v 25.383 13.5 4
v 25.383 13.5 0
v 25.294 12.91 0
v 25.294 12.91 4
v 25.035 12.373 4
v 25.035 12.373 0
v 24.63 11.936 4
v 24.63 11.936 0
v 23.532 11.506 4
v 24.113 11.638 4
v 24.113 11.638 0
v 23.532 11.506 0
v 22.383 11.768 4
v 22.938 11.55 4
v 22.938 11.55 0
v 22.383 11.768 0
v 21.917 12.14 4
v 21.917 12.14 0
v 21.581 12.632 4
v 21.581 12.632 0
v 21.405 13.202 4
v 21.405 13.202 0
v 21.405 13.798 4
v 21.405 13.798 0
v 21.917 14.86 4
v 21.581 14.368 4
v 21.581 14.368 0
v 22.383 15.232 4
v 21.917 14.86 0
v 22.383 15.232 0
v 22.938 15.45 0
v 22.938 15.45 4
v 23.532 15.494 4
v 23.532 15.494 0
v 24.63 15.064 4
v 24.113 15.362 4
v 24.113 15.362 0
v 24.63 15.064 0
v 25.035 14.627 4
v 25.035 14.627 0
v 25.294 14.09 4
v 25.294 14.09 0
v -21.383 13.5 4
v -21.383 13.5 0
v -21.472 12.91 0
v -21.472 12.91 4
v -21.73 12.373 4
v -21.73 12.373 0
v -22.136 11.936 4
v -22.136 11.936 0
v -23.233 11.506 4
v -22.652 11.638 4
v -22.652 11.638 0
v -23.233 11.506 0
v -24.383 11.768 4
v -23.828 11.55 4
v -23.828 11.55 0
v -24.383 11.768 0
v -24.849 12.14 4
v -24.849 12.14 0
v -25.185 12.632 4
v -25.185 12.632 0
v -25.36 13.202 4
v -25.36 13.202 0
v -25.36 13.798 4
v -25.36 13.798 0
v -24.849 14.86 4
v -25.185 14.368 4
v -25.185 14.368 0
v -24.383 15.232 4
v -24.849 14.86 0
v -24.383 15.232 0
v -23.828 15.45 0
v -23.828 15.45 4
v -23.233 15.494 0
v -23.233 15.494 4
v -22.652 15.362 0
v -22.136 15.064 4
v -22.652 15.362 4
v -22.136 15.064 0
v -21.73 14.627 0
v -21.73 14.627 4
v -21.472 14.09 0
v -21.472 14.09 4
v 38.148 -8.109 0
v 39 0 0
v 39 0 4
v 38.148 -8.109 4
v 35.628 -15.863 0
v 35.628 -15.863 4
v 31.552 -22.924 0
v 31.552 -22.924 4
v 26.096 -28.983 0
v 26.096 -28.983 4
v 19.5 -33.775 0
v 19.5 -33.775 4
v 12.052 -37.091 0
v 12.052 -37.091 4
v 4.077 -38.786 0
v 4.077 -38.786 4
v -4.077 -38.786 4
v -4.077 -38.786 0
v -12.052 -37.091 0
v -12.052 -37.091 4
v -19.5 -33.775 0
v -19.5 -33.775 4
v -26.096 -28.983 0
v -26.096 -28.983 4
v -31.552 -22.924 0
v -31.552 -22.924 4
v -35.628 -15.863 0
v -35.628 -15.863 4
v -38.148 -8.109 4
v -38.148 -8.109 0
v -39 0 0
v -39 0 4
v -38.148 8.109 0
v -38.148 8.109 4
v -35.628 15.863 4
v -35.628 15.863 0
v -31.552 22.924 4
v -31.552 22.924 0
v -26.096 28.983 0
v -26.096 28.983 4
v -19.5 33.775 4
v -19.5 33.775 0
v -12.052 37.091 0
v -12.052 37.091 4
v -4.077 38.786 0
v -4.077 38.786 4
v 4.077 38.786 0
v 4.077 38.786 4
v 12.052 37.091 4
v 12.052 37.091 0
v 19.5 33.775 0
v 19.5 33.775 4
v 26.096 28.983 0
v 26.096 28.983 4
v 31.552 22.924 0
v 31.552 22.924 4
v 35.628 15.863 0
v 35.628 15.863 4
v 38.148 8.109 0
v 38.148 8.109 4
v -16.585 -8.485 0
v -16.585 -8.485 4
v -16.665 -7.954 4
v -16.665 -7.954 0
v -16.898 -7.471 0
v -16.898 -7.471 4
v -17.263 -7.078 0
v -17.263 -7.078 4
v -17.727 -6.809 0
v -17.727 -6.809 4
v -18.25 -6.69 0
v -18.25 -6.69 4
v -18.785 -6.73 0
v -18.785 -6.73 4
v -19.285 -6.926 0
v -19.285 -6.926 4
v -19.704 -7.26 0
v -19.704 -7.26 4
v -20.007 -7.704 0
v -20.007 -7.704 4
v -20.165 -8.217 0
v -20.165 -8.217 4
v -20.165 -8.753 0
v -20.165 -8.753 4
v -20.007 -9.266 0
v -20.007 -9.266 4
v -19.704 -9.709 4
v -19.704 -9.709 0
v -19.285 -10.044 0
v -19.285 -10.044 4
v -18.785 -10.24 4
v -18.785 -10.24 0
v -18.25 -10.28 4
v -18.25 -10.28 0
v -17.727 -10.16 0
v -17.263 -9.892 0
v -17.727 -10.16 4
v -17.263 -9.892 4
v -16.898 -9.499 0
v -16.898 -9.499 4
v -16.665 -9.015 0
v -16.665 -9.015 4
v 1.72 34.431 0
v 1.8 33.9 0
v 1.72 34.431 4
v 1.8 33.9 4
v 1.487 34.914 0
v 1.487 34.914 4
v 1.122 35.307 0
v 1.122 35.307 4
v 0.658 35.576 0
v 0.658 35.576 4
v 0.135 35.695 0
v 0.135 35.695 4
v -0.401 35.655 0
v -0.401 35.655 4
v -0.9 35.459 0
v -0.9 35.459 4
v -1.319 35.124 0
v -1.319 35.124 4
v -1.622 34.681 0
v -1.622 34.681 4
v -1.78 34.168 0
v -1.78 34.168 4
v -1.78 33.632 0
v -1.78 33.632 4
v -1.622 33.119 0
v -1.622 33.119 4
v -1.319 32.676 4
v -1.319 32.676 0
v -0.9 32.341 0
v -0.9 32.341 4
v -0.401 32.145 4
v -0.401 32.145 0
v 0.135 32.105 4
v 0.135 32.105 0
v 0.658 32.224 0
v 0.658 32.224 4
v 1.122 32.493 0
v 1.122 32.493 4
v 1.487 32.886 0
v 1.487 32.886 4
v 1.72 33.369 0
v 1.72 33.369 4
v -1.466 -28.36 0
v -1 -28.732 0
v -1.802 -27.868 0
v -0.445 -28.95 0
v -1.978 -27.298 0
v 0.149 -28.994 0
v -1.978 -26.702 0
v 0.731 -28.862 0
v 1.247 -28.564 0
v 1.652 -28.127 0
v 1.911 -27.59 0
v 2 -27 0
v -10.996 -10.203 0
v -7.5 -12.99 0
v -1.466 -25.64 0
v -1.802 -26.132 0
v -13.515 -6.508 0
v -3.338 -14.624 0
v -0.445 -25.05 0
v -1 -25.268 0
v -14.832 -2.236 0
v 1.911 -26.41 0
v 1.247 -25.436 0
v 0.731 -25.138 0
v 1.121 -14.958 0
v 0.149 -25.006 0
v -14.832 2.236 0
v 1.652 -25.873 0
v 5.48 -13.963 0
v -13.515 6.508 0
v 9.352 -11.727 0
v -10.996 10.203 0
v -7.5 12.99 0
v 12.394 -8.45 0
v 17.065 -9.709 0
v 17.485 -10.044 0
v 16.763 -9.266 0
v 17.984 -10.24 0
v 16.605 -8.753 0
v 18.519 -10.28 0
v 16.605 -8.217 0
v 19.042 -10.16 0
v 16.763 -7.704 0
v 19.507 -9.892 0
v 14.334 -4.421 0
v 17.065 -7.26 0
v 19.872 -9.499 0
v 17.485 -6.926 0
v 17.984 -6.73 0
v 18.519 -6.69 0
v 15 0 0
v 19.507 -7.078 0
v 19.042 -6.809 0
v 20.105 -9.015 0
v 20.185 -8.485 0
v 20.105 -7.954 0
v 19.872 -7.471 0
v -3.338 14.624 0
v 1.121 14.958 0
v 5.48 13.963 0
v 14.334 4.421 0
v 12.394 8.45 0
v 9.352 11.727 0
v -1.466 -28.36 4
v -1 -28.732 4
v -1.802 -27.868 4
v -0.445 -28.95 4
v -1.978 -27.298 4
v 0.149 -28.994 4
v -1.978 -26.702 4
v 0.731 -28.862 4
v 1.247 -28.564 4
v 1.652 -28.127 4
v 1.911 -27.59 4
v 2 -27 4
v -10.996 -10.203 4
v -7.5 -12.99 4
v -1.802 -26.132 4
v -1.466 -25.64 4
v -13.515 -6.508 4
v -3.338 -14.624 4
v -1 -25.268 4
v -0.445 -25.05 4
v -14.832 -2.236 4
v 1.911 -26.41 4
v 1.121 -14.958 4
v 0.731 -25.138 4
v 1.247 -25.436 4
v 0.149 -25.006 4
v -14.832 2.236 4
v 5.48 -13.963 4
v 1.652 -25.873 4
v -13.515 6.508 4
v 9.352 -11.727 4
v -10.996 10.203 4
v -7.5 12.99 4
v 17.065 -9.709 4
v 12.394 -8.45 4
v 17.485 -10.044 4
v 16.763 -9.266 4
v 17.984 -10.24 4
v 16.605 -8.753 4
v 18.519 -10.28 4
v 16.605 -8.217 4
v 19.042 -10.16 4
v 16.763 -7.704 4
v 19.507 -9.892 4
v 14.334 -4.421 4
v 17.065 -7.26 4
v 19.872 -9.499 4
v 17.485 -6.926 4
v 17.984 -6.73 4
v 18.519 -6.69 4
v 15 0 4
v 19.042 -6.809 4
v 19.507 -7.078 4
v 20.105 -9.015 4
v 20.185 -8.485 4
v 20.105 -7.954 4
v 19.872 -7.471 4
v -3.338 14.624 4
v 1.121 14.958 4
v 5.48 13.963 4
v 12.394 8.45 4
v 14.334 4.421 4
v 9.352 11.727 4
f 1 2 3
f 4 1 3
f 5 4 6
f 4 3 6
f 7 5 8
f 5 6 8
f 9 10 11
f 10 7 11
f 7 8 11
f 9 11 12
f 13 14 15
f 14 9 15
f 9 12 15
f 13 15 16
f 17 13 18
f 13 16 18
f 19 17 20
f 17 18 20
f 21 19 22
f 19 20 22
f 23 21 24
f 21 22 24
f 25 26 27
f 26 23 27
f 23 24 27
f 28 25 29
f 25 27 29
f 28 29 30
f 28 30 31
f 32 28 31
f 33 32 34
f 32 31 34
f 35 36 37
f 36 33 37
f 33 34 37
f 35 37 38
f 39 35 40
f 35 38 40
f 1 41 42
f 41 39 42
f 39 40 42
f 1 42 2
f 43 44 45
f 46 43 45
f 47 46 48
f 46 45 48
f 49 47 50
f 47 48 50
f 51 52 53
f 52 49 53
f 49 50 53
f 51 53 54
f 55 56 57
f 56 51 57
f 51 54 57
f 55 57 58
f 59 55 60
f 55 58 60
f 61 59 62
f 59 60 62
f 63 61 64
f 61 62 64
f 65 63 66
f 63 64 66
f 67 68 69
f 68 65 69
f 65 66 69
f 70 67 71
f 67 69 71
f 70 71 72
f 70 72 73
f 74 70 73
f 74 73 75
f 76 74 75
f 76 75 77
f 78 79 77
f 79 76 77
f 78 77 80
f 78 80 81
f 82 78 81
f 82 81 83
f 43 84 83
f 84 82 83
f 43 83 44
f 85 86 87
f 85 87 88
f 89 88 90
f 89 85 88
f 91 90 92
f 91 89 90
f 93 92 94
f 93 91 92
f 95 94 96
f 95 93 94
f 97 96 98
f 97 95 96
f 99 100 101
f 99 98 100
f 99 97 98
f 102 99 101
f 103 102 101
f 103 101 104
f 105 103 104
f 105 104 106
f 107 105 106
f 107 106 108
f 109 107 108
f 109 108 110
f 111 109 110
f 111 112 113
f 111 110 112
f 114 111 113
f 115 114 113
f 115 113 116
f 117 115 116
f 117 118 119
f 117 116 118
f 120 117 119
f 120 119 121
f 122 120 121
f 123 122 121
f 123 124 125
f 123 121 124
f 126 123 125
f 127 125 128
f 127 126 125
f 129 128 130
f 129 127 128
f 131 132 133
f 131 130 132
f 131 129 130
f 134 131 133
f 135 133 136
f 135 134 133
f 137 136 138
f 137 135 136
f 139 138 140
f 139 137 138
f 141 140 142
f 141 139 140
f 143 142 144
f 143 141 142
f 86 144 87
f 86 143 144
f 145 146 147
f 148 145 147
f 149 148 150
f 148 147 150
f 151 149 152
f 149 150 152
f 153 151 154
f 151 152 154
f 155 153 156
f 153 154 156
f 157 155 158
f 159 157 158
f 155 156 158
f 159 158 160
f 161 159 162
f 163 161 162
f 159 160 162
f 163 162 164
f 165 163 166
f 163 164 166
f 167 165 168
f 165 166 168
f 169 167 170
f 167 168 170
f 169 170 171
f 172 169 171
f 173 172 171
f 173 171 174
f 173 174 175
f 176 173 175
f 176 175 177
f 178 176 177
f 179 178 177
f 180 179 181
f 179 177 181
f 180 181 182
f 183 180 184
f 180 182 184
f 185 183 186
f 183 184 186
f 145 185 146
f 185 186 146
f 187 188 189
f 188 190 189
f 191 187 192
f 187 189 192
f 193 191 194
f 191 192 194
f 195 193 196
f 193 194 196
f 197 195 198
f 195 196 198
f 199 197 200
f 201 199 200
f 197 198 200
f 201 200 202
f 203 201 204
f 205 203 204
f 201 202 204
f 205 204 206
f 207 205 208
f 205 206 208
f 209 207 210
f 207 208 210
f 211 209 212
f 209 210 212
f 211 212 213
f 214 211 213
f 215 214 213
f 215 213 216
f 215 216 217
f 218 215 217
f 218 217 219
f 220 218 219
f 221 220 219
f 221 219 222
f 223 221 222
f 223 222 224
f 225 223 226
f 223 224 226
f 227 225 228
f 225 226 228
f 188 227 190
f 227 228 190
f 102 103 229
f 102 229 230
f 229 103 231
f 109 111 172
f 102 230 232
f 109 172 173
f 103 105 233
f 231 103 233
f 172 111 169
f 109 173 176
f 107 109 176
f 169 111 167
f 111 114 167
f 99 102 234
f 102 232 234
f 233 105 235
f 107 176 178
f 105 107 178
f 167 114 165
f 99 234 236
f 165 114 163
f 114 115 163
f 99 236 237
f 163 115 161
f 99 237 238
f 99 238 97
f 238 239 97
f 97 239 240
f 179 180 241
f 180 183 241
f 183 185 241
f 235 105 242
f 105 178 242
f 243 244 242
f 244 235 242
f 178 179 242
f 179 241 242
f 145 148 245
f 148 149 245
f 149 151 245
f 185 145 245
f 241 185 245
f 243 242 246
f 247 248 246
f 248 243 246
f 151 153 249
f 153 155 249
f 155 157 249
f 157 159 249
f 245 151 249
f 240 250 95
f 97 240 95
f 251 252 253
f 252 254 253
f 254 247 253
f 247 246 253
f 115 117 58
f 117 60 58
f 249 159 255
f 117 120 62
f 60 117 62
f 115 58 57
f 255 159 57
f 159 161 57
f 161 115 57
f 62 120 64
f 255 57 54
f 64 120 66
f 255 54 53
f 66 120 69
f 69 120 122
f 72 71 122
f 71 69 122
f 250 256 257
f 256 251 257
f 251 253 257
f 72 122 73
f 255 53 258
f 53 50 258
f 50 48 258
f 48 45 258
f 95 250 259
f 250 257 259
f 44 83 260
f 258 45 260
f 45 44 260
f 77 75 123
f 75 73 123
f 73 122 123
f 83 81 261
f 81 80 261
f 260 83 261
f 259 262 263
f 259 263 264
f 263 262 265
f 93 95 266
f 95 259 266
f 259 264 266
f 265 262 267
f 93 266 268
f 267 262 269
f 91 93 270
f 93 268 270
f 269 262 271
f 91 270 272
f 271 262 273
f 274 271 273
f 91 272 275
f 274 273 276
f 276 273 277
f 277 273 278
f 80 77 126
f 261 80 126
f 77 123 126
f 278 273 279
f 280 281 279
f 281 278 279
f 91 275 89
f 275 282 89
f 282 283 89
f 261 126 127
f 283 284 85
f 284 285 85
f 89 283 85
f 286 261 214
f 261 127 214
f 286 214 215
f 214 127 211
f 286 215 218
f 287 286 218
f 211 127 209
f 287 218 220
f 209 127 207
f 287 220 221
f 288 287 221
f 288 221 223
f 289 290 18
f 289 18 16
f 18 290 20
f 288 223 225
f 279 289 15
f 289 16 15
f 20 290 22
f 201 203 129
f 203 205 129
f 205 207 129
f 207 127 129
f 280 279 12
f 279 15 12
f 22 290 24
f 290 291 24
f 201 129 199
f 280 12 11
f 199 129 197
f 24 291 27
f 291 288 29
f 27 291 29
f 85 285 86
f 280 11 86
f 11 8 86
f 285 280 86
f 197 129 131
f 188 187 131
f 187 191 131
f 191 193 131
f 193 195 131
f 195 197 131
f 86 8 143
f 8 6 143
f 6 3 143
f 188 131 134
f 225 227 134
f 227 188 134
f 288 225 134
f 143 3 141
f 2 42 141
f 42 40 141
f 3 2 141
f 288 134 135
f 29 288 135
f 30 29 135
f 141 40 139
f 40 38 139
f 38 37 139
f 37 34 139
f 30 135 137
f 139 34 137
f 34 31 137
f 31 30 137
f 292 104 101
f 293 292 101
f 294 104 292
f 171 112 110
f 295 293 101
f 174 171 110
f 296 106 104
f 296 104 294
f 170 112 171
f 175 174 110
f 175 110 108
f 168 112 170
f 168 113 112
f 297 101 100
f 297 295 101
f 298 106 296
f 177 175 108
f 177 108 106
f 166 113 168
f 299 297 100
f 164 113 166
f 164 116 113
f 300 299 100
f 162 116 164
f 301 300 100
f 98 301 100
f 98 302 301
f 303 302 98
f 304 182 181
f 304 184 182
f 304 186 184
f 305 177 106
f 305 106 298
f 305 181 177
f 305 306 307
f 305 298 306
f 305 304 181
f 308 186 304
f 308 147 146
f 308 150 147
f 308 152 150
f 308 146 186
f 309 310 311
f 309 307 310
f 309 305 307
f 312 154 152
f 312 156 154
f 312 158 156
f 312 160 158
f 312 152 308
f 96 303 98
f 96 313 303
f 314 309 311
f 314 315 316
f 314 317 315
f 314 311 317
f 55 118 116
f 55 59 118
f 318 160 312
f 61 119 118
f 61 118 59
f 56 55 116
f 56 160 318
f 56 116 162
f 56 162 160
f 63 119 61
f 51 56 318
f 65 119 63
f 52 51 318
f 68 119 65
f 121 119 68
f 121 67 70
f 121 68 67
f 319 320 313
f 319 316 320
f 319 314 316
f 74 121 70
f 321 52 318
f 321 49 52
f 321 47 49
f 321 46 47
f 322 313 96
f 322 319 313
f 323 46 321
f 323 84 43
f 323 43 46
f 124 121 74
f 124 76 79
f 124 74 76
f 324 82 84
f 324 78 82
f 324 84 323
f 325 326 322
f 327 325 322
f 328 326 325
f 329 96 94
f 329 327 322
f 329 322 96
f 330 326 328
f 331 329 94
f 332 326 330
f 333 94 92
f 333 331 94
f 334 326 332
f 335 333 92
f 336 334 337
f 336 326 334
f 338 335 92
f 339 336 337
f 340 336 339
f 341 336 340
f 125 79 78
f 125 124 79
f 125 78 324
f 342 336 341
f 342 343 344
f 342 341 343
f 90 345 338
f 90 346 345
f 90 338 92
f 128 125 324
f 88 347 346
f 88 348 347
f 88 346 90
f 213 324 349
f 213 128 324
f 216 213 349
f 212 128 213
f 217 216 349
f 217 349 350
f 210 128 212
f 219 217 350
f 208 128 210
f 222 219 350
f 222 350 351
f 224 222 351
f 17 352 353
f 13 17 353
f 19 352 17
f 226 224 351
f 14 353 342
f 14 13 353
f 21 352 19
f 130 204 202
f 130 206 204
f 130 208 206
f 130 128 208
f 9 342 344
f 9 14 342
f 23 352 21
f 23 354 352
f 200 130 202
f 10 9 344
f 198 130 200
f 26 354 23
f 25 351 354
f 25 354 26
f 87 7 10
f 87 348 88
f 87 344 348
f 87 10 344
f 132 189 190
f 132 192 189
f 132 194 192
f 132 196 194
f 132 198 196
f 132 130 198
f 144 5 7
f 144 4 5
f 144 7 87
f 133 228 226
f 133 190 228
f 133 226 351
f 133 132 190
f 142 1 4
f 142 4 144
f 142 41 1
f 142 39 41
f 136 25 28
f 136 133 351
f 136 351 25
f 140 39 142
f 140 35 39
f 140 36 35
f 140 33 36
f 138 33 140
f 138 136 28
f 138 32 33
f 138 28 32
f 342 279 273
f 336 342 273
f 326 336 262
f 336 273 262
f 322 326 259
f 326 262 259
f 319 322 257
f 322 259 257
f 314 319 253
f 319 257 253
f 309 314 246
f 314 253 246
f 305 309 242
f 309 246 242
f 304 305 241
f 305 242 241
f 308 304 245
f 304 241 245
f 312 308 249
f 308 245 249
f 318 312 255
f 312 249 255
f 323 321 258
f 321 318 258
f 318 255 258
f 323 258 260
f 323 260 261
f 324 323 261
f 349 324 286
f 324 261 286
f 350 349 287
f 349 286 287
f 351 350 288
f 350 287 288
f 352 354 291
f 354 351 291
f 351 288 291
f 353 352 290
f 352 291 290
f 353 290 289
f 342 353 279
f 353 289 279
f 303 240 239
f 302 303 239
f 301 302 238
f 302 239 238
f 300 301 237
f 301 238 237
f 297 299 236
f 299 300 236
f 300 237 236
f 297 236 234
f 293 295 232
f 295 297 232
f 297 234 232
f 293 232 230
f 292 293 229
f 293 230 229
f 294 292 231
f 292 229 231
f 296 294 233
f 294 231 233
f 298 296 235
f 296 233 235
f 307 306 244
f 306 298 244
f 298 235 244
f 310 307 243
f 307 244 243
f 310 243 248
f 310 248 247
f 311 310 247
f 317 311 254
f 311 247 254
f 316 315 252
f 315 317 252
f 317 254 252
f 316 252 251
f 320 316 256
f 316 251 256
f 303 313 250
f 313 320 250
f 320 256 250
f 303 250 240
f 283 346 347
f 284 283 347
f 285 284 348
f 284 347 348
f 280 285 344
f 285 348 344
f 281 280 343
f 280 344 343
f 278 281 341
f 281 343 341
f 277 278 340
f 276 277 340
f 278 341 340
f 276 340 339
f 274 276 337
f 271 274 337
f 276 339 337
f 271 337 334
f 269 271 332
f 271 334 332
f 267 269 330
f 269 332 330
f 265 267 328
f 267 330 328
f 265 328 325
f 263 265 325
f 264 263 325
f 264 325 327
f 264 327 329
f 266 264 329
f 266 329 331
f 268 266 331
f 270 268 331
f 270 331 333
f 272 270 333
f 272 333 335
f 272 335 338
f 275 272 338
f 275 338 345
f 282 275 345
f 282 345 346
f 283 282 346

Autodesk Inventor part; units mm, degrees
ref_plane "YZ Plane" through (0, 0, 0) normal (1, 0, 0) x (0, 1, 0)
ref_plane "XZ Plane" through (0, 0, 0) normal (0, 1, 0) x (-1, 0, 0)
ref_plane "XY Plane" through (0, 0, 0) normal (0, 0, 1) x (1, 0, 0)
sketch "Sketch1" plane through (0, 0, 0) normal (0, 0, 1) x (1, 0, 0)
  circle A0 centre (0, 0) radius 39
  circle A1 centre (0, -27) radius 2
  circle A2 centre (23.3827, 13.5) radius 2
  circle A3 centre (-23.3827, 13.5) radius 2
  circle A4 centre (0, 0) radius 15
  dimension "d2" = 4
  dimension "d3" = 27
  dimension "d4" = 360
  dimension "d5" = 30
  dimension "d12" = 78
extrude "Extrusion1" add sketch "Sketch1" along normal blind 4
sketch "Sketch4" plane through (0, 0, 4) normal (0, 0, 1) x (1, 0, 0)
  circle A0 centre (0, 33.9) radius 1.8
  circle A1 centre (-18.3848, -8.4848) radius 1.8
  circle A2 centre (18.3848, -8.4848) radius 1.8
  circle A3 centre (0, 0) radius 39
  circle A4 centre (-23.3827, 13.5) radius 1.5001
  circle A5 centre (0, -27) radius 1.5001
  circle A6 centre (23.3827, 13.5) radius 1.5001
extrude "Extrusion4" cut sketch "Sketch4" against normal blind 4 contours A0 | A1 | A2
properties part number "SUPORT STEEP"
